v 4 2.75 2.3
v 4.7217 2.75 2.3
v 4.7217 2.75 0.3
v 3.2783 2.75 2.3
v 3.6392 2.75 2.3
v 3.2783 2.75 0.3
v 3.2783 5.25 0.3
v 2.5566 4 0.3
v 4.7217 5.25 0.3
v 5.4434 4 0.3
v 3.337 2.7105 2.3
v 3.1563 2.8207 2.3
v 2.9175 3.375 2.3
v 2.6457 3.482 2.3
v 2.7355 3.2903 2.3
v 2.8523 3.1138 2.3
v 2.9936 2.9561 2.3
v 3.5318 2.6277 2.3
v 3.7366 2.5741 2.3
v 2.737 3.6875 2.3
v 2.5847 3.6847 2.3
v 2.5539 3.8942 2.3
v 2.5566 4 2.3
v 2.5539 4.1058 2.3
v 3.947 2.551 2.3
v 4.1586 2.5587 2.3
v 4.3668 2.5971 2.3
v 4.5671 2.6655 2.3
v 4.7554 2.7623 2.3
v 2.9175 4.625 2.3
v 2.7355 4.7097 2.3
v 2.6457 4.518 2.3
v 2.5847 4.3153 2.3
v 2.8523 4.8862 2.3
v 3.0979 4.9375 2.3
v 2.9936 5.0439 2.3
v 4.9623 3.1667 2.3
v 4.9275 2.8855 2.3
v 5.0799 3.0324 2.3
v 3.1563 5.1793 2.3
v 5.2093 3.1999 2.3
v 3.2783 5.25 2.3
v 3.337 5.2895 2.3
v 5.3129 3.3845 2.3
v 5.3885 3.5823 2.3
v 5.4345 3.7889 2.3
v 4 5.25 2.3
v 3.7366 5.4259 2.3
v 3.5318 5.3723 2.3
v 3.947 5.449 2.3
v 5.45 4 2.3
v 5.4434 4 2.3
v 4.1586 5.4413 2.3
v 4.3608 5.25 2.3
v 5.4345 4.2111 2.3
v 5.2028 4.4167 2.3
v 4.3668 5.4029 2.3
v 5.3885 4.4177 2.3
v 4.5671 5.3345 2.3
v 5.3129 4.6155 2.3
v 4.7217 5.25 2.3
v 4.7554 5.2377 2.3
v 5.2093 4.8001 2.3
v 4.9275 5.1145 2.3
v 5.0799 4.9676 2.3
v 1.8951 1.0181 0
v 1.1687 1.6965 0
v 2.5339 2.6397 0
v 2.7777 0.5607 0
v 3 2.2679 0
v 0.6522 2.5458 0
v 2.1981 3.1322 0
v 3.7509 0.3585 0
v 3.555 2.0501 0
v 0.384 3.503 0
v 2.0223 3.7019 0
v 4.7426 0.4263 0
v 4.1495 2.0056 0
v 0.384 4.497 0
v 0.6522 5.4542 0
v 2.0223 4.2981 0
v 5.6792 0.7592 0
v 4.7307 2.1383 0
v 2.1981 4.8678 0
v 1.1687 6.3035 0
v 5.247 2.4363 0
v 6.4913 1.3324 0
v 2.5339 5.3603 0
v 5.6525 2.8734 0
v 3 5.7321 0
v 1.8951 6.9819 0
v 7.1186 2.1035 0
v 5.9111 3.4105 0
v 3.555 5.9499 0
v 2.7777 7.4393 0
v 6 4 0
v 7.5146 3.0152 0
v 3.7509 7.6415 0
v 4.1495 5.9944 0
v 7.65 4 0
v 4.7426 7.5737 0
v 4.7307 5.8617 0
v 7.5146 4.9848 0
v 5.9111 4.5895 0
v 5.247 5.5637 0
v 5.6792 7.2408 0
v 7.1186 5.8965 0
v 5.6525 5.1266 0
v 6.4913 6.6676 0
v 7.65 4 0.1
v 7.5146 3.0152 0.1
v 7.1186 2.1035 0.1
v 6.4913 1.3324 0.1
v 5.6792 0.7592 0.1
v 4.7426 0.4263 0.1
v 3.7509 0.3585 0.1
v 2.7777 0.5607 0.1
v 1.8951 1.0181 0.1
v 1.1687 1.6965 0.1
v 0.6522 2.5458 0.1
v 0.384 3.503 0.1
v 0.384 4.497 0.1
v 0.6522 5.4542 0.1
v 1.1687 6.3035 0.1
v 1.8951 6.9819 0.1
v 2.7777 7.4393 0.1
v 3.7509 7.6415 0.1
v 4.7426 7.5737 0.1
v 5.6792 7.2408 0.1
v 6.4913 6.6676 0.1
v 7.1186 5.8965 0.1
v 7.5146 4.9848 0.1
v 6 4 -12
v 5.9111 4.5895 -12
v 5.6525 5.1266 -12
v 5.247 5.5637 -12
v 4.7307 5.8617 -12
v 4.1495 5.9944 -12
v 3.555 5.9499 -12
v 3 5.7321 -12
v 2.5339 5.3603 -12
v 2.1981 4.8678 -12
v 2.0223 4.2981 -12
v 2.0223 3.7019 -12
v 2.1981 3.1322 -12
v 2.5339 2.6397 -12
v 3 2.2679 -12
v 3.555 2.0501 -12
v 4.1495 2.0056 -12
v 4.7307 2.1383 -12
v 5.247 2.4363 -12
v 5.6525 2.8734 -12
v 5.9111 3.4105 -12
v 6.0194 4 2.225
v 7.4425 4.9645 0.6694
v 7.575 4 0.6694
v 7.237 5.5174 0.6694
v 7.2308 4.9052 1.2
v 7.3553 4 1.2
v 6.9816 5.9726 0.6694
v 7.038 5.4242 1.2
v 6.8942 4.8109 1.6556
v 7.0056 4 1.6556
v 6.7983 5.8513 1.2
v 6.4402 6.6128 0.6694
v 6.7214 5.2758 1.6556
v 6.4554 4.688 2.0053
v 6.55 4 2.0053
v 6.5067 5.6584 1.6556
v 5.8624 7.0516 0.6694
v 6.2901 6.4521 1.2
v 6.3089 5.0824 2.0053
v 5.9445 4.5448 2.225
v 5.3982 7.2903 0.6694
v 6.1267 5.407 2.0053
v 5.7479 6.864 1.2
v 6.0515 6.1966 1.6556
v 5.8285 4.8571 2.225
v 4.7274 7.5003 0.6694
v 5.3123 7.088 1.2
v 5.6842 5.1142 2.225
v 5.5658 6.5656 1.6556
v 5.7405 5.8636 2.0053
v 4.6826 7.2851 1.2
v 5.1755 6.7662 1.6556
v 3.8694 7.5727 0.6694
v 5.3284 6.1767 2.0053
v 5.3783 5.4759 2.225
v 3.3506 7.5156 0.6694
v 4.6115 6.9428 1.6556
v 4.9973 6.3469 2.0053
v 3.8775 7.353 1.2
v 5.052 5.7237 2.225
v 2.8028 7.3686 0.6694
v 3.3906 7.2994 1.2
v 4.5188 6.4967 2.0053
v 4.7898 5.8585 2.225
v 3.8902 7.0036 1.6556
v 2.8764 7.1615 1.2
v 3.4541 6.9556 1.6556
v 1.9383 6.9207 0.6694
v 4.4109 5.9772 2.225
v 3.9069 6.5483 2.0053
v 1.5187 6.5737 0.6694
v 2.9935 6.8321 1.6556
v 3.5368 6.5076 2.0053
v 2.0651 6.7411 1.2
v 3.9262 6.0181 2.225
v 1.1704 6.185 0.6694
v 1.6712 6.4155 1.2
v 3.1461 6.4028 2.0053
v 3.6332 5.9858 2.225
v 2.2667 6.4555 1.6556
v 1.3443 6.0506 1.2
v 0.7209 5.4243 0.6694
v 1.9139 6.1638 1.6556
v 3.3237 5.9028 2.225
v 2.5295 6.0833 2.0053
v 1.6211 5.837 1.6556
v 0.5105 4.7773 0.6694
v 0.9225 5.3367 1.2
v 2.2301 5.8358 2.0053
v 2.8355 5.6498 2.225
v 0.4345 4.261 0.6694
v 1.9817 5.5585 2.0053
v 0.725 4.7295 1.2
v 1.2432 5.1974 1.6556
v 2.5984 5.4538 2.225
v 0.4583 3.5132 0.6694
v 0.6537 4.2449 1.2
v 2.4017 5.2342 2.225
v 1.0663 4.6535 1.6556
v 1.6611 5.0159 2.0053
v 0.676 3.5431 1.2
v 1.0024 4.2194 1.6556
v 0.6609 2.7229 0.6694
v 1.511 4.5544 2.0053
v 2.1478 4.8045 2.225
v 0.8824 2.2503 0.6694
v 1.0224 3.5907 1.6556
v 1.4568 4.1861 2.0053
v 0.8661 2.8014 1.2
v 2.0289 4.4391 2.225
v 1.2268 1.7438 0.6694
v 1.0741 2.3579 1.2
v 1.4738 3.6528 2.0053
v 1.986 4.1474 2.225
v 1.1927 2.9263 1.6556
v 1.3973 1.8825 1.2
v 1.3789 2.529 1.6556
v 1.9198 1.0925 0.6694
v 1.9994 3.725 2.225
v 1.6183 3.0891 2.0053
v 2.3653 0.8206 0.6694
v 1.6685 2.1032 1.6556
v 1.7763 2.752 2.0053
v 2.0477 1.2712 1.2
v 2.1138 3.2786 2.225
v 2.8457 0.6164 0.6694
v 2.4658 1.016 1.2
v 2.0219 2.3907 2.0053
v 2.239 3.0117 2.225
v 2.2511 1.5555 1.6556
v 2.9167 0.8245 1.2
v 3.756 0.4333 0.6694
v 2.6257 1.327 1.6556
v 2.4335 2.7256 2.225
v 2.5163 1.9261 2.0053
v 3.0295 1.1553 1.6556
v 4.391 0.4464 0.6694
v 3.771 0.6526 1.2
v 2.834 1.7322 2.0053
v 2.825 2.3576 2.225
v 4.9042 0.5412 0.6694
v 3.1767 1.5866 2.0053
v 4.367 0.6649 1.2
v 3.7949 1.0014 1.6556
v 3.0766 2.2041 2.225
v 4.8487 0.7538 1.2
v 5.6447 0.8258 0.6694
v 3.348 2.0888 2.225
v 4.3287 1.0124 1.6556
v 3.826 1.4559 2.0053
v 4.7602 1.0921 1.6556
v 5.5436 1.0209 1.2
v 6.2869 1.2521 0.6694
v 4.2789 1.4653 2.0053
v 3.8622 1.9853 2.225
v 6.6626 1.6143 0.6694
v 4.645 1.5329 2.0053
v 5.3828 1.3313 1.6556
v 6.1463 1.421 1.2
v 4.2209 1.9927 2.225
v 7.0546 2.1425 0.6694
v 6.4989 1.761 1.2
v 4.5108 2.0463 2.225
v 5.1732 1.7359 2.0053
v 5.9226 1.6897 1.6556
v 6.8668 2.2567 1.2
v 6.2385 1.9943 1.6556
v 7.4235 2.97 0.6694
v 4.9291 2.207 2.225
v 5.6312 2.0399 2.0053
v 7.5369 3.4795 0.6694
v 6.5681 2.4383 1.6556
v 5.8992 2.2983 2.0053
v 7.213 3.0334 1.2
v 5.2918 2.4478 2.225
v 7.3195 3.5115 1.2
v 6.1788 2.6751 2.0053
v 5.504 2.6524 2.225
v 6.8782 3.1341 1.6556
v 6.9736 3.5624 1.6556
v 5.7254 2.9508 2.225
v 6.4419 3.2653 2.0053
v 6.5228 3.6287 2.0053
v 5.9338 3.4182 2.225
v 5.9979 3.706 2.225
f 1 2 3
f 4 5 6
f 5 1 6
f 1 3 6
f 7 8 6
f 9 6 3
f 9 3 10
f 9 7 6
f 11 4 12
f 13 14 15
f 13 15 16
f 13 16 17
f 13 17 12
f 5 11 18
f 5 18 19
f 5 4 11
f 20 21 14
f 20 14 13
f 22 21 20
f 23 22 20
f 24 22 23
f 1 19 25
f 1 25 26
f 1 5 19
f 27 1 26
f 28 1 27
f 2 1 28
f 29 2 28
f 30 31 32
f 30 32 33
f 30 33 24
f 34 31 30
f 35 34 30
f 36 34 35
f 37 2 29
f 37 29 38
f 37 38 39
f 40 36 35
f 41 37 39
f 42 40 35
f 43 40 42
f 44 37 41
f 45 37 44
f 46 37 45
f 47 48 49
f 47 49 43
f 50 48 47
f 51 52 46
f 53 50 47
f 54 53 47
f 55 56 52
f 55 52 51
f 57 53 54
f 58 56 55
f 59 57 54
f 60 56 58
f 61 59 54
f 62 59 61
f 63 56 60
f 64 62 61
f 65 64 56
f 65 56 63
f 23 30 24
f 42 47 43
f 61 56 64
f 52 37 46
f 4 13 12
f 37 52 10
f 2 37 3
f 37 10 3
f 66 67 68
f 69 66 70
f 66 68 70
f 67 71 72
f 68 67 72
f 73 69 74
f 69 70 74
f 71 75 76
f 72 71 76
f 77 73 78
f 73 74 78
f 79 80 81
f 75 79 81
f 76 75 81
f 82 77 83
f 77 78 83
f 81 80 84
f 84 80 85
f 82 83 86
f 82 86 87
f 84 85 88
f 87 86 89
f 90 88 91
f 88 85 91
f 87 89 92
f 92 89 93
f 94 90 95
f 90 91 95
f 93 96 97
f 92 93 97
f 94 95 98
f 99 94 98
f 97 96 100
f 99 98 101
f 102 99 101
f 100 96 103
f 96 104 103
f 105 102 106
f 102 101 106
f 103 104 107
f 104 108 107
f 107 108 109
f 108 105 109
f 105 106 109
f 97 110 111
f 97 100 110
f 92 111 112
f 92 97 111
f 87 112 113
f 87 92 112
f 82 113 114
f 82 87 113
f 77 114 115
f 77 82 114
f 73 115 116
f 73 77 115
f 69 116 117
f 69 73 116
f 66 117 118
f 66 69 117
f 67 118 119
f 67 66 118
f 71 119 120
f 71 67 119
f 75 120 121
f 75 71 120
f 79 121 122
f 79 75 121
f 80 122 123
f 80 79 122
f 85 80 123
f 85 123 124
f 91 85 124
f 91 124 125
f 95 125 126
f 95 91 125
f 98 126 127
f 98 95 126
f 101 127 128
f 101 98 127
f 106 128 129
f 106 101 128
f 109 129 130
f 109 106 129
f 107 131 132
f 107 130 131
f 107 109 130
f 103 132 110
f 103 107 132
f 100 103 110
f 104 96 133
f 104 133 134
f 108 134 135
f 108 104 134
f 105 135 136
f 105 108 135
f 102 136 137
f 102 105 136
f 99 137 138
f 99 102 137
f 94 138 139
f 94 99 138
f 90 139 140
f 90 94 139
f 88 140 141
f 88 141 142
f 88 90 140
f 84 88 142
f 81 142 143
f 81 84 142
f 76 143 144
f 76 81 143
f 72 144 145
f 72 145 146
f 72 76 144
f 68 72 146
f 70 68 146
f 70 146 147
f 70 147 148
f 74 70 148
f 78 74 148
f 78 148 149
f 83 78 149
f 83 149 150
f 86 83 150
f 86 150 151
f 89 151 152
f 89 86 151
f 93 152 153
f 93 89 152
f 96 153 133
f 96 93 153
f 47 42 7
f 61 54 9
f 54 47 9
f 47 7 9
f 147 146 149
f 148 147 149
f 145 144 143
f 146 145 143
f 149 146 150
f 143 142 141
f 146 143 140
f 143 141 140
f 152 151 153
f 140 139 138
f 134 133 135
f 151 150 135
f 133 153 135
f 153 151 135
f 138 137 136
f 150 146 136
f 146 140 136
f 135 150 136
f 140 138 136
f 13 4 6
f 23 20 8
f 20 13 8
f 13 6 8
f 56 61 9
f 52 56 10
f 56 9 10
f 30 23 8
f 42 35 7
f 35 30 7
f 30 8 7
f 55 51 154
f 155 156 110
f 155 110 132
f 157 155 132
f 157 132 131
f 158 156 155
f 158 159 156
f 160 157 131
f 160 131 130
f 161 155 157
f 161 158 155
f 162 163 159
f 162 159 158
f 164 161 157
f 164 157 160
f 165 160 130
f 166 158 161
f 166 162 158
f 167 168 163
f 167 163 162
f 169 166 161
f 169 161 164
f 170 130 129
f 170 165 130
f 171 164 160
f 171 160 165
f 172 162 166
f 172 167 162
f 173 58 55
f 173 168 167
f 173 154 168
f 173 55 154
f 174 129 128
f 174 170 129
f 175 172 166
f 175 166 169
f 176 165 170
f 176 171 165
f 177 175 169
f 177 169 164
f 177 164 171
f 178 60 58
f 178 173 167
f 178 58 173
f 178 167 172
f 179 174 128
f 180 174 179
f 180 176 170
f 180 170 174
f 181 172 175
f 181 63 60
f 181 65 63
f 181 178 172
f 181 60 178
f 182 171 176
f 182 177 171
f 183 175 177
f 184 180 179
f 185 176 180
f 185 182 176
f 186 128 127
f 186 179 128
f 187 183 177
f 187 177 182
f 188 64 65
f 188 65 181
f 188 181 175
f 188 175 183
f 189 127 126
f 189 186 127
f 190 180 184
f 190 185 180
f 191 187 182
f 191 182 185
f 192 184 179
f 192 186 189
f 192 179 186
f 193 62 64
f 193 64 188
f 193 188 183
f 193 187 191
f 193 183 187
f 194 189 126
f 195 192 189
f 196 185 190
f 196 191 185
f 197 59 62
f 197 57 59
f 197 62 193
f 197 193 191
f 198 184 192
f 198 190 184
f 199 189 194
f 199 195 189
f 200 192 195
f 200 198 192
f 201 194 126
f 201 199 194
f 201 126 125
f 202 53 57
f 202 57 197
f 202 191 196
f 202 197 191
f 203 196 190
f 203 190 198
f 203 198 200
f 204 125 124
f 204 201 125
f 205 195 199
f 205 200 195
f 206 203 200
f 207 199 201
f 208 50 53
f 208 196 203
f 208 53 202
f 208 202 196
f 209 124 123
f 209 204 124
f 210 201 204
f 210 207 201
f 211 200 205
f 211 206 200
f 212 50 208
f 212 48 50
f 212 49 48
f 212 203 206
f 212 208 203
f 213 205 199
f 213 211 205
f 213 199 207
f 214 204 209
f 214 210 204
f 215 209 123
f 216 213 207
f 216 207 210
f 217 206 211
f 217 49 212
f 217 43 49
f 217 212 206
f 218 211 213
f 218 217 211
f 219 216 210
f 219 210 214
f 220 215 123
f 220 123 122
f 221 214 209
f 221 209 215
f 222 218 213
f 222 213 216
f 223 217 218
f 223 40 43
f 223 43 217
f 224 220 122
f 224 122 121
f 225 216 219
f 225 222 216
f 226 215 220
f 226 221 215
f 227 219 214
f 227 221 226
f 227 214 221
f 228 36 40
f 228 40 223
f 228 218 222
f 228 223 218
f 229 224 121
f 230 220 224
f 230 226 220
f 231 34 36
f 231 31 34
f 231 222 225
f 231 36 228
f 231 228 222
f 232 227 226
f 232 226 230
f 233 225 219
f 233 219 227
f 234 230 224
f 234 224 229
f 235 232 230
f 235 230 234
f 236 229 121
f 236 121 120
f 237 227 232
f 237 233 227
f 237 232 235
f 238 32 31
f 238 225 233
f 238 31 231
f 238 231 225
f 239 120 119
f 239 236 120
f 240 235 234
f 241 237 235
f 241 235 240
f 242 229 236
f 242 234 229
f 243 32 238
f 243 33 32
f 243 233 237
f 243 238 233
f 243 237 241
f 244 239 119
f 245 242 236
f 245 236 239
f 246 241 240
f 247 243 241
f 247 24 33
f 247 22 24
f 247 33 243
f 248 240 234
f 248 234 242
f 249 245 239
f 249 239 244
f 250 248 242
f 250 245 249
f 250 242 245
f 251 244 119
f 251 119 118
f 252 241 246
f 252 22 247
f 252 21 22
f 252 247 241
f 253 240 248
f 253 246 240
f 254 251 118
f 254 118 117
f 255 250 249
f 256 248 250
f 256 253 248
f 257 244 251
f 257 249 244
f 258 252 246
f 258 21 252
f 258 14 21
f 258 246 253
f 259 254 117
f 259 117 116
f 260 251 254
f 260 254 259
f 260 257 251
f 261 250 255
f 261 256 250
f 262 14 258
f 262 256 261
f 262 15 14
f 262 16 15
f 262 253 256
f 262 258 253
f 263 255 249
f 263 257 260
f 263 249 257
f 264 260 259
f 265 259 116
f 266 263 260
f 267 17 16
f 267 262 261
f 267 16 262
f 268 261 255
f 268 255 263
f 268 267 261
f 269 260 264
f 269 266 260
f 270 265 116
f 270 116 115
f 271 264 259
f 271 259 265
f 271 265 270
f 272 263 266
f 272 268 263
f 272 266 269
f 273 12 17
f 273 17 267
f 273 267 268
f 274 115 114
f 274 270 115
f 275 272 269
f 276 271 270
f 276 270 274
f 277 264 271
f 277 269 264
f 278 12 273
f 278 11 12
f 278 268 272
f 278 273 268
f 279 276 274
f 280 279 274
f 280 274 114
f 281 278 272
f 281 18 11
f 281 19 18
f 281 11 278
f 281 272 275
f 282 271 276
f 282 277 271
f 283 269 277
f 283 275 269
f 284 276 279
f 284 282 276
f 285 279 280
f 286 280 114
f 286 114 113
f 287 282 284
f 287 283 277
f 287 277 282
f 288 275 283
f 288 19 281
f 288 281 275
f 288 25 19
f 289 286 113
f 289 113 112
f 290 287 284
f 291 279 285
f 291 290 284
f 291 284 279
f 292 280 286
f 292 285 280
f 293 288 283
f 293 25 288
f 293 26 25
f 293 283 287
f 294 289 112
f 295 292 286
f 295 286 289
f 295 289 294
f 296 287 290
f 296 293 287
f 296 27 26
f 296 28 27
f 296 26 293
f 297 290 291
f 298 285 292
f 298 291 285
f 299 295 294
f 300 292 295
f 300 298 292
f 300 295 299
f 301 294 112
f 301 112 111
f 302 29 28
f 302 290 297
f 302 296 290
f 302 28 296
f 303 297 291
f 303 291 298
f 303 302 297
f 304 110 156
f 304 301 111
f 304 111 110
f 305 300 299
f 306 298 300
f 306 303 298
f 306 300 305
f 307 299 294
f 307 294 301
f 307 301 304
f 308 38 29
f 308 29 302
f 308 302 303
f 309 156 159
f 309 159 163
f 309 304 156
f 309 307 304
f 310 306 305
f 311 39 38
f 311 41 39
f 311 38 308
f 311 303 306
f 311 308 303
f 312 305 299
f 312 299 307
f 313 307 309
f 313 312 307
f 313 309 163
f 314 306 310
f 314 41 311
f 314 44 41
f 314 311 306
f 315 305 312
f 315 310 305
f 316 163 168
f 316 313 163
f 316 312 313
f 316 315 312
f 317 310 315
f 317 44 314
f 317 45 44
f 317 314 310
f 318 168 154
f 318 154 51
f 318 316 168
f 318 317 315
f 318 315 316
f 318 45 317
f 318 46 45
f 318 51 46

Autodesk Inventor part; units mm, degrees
ref_plane "YZ Plane" through (0, 0, 0) normal (1, 0, 0) x (0, 1, 0)
ref_plane "XZ Plane" through (0, 0, 0) normal (0, 1, 0) x (-1, 0, 0)
ref_plane "XY Plane" through (0, 0, 0) normal (0, 0, 1) x (1, 0, 0)
sketch "Sketch1" plane through (0, 0, 0) normal (0, 0, 1) x (1, 0, 0)
  circle A0 centre (4, 4) radius 1.2 projected
  circle A1 centre (4, 4) radius 2
  point P0 (0, 0)
  dimension "d0" = 4
extrude "Extrusion1" add sketch "Sketch1" against normal blind 12 contours A0 | A1
sketch "Sketch2" plane through (4, 4, 0) normal (0, 0, 1) x (1, 0, 0)
  circle A0 centre (0, 0) radius 2 projected
  circle A1 centre (0, 0) radius 3.65
  point P0 (-4, -4)
  dimension "d3" = 7.3
extrude "Extrusion2" add sketch "Sketch2" along normal blind 2.3 contours A0 | A1
fillet "Fillet1" radius 2.2 1 edges at (0.35, 4, 2.3)
sketch "Sketch4" plane through (4, 4, 2.3) normal (0, 0, 1) x (1, 0, 0)
  circle A0 centre (0, 0) radius 1.45 projected
  line L0 (0.7217, 1.25) -> (1.4434, 0)
  line L1 (1.4434, 0) -> (0.7217, -1.25)
  line L2 (0.7217, -1.25) -> (-0.7217, -1.25)
  line L3 (-0.7217, -1.25) -> (-1.4434, 0)
  line L4 (-1.4434, 0) -> (-0.7217, 1.25)
  line L5 (-0.7217, 1.25) -> (0.7217, 1.25)
  point P0 (-4, -4)
  dimension "d10" = 2.5
extrude "Extrusion4" cut sketch "Sketch4" along normal mid plane 4 contours L0 L1 L2 L3 L4 L5
thread "Thread1" size "M3x0.5" class "6g" standard "ANSI Metric M Profile" full length
properties part number "m3 6" material "Steel"
